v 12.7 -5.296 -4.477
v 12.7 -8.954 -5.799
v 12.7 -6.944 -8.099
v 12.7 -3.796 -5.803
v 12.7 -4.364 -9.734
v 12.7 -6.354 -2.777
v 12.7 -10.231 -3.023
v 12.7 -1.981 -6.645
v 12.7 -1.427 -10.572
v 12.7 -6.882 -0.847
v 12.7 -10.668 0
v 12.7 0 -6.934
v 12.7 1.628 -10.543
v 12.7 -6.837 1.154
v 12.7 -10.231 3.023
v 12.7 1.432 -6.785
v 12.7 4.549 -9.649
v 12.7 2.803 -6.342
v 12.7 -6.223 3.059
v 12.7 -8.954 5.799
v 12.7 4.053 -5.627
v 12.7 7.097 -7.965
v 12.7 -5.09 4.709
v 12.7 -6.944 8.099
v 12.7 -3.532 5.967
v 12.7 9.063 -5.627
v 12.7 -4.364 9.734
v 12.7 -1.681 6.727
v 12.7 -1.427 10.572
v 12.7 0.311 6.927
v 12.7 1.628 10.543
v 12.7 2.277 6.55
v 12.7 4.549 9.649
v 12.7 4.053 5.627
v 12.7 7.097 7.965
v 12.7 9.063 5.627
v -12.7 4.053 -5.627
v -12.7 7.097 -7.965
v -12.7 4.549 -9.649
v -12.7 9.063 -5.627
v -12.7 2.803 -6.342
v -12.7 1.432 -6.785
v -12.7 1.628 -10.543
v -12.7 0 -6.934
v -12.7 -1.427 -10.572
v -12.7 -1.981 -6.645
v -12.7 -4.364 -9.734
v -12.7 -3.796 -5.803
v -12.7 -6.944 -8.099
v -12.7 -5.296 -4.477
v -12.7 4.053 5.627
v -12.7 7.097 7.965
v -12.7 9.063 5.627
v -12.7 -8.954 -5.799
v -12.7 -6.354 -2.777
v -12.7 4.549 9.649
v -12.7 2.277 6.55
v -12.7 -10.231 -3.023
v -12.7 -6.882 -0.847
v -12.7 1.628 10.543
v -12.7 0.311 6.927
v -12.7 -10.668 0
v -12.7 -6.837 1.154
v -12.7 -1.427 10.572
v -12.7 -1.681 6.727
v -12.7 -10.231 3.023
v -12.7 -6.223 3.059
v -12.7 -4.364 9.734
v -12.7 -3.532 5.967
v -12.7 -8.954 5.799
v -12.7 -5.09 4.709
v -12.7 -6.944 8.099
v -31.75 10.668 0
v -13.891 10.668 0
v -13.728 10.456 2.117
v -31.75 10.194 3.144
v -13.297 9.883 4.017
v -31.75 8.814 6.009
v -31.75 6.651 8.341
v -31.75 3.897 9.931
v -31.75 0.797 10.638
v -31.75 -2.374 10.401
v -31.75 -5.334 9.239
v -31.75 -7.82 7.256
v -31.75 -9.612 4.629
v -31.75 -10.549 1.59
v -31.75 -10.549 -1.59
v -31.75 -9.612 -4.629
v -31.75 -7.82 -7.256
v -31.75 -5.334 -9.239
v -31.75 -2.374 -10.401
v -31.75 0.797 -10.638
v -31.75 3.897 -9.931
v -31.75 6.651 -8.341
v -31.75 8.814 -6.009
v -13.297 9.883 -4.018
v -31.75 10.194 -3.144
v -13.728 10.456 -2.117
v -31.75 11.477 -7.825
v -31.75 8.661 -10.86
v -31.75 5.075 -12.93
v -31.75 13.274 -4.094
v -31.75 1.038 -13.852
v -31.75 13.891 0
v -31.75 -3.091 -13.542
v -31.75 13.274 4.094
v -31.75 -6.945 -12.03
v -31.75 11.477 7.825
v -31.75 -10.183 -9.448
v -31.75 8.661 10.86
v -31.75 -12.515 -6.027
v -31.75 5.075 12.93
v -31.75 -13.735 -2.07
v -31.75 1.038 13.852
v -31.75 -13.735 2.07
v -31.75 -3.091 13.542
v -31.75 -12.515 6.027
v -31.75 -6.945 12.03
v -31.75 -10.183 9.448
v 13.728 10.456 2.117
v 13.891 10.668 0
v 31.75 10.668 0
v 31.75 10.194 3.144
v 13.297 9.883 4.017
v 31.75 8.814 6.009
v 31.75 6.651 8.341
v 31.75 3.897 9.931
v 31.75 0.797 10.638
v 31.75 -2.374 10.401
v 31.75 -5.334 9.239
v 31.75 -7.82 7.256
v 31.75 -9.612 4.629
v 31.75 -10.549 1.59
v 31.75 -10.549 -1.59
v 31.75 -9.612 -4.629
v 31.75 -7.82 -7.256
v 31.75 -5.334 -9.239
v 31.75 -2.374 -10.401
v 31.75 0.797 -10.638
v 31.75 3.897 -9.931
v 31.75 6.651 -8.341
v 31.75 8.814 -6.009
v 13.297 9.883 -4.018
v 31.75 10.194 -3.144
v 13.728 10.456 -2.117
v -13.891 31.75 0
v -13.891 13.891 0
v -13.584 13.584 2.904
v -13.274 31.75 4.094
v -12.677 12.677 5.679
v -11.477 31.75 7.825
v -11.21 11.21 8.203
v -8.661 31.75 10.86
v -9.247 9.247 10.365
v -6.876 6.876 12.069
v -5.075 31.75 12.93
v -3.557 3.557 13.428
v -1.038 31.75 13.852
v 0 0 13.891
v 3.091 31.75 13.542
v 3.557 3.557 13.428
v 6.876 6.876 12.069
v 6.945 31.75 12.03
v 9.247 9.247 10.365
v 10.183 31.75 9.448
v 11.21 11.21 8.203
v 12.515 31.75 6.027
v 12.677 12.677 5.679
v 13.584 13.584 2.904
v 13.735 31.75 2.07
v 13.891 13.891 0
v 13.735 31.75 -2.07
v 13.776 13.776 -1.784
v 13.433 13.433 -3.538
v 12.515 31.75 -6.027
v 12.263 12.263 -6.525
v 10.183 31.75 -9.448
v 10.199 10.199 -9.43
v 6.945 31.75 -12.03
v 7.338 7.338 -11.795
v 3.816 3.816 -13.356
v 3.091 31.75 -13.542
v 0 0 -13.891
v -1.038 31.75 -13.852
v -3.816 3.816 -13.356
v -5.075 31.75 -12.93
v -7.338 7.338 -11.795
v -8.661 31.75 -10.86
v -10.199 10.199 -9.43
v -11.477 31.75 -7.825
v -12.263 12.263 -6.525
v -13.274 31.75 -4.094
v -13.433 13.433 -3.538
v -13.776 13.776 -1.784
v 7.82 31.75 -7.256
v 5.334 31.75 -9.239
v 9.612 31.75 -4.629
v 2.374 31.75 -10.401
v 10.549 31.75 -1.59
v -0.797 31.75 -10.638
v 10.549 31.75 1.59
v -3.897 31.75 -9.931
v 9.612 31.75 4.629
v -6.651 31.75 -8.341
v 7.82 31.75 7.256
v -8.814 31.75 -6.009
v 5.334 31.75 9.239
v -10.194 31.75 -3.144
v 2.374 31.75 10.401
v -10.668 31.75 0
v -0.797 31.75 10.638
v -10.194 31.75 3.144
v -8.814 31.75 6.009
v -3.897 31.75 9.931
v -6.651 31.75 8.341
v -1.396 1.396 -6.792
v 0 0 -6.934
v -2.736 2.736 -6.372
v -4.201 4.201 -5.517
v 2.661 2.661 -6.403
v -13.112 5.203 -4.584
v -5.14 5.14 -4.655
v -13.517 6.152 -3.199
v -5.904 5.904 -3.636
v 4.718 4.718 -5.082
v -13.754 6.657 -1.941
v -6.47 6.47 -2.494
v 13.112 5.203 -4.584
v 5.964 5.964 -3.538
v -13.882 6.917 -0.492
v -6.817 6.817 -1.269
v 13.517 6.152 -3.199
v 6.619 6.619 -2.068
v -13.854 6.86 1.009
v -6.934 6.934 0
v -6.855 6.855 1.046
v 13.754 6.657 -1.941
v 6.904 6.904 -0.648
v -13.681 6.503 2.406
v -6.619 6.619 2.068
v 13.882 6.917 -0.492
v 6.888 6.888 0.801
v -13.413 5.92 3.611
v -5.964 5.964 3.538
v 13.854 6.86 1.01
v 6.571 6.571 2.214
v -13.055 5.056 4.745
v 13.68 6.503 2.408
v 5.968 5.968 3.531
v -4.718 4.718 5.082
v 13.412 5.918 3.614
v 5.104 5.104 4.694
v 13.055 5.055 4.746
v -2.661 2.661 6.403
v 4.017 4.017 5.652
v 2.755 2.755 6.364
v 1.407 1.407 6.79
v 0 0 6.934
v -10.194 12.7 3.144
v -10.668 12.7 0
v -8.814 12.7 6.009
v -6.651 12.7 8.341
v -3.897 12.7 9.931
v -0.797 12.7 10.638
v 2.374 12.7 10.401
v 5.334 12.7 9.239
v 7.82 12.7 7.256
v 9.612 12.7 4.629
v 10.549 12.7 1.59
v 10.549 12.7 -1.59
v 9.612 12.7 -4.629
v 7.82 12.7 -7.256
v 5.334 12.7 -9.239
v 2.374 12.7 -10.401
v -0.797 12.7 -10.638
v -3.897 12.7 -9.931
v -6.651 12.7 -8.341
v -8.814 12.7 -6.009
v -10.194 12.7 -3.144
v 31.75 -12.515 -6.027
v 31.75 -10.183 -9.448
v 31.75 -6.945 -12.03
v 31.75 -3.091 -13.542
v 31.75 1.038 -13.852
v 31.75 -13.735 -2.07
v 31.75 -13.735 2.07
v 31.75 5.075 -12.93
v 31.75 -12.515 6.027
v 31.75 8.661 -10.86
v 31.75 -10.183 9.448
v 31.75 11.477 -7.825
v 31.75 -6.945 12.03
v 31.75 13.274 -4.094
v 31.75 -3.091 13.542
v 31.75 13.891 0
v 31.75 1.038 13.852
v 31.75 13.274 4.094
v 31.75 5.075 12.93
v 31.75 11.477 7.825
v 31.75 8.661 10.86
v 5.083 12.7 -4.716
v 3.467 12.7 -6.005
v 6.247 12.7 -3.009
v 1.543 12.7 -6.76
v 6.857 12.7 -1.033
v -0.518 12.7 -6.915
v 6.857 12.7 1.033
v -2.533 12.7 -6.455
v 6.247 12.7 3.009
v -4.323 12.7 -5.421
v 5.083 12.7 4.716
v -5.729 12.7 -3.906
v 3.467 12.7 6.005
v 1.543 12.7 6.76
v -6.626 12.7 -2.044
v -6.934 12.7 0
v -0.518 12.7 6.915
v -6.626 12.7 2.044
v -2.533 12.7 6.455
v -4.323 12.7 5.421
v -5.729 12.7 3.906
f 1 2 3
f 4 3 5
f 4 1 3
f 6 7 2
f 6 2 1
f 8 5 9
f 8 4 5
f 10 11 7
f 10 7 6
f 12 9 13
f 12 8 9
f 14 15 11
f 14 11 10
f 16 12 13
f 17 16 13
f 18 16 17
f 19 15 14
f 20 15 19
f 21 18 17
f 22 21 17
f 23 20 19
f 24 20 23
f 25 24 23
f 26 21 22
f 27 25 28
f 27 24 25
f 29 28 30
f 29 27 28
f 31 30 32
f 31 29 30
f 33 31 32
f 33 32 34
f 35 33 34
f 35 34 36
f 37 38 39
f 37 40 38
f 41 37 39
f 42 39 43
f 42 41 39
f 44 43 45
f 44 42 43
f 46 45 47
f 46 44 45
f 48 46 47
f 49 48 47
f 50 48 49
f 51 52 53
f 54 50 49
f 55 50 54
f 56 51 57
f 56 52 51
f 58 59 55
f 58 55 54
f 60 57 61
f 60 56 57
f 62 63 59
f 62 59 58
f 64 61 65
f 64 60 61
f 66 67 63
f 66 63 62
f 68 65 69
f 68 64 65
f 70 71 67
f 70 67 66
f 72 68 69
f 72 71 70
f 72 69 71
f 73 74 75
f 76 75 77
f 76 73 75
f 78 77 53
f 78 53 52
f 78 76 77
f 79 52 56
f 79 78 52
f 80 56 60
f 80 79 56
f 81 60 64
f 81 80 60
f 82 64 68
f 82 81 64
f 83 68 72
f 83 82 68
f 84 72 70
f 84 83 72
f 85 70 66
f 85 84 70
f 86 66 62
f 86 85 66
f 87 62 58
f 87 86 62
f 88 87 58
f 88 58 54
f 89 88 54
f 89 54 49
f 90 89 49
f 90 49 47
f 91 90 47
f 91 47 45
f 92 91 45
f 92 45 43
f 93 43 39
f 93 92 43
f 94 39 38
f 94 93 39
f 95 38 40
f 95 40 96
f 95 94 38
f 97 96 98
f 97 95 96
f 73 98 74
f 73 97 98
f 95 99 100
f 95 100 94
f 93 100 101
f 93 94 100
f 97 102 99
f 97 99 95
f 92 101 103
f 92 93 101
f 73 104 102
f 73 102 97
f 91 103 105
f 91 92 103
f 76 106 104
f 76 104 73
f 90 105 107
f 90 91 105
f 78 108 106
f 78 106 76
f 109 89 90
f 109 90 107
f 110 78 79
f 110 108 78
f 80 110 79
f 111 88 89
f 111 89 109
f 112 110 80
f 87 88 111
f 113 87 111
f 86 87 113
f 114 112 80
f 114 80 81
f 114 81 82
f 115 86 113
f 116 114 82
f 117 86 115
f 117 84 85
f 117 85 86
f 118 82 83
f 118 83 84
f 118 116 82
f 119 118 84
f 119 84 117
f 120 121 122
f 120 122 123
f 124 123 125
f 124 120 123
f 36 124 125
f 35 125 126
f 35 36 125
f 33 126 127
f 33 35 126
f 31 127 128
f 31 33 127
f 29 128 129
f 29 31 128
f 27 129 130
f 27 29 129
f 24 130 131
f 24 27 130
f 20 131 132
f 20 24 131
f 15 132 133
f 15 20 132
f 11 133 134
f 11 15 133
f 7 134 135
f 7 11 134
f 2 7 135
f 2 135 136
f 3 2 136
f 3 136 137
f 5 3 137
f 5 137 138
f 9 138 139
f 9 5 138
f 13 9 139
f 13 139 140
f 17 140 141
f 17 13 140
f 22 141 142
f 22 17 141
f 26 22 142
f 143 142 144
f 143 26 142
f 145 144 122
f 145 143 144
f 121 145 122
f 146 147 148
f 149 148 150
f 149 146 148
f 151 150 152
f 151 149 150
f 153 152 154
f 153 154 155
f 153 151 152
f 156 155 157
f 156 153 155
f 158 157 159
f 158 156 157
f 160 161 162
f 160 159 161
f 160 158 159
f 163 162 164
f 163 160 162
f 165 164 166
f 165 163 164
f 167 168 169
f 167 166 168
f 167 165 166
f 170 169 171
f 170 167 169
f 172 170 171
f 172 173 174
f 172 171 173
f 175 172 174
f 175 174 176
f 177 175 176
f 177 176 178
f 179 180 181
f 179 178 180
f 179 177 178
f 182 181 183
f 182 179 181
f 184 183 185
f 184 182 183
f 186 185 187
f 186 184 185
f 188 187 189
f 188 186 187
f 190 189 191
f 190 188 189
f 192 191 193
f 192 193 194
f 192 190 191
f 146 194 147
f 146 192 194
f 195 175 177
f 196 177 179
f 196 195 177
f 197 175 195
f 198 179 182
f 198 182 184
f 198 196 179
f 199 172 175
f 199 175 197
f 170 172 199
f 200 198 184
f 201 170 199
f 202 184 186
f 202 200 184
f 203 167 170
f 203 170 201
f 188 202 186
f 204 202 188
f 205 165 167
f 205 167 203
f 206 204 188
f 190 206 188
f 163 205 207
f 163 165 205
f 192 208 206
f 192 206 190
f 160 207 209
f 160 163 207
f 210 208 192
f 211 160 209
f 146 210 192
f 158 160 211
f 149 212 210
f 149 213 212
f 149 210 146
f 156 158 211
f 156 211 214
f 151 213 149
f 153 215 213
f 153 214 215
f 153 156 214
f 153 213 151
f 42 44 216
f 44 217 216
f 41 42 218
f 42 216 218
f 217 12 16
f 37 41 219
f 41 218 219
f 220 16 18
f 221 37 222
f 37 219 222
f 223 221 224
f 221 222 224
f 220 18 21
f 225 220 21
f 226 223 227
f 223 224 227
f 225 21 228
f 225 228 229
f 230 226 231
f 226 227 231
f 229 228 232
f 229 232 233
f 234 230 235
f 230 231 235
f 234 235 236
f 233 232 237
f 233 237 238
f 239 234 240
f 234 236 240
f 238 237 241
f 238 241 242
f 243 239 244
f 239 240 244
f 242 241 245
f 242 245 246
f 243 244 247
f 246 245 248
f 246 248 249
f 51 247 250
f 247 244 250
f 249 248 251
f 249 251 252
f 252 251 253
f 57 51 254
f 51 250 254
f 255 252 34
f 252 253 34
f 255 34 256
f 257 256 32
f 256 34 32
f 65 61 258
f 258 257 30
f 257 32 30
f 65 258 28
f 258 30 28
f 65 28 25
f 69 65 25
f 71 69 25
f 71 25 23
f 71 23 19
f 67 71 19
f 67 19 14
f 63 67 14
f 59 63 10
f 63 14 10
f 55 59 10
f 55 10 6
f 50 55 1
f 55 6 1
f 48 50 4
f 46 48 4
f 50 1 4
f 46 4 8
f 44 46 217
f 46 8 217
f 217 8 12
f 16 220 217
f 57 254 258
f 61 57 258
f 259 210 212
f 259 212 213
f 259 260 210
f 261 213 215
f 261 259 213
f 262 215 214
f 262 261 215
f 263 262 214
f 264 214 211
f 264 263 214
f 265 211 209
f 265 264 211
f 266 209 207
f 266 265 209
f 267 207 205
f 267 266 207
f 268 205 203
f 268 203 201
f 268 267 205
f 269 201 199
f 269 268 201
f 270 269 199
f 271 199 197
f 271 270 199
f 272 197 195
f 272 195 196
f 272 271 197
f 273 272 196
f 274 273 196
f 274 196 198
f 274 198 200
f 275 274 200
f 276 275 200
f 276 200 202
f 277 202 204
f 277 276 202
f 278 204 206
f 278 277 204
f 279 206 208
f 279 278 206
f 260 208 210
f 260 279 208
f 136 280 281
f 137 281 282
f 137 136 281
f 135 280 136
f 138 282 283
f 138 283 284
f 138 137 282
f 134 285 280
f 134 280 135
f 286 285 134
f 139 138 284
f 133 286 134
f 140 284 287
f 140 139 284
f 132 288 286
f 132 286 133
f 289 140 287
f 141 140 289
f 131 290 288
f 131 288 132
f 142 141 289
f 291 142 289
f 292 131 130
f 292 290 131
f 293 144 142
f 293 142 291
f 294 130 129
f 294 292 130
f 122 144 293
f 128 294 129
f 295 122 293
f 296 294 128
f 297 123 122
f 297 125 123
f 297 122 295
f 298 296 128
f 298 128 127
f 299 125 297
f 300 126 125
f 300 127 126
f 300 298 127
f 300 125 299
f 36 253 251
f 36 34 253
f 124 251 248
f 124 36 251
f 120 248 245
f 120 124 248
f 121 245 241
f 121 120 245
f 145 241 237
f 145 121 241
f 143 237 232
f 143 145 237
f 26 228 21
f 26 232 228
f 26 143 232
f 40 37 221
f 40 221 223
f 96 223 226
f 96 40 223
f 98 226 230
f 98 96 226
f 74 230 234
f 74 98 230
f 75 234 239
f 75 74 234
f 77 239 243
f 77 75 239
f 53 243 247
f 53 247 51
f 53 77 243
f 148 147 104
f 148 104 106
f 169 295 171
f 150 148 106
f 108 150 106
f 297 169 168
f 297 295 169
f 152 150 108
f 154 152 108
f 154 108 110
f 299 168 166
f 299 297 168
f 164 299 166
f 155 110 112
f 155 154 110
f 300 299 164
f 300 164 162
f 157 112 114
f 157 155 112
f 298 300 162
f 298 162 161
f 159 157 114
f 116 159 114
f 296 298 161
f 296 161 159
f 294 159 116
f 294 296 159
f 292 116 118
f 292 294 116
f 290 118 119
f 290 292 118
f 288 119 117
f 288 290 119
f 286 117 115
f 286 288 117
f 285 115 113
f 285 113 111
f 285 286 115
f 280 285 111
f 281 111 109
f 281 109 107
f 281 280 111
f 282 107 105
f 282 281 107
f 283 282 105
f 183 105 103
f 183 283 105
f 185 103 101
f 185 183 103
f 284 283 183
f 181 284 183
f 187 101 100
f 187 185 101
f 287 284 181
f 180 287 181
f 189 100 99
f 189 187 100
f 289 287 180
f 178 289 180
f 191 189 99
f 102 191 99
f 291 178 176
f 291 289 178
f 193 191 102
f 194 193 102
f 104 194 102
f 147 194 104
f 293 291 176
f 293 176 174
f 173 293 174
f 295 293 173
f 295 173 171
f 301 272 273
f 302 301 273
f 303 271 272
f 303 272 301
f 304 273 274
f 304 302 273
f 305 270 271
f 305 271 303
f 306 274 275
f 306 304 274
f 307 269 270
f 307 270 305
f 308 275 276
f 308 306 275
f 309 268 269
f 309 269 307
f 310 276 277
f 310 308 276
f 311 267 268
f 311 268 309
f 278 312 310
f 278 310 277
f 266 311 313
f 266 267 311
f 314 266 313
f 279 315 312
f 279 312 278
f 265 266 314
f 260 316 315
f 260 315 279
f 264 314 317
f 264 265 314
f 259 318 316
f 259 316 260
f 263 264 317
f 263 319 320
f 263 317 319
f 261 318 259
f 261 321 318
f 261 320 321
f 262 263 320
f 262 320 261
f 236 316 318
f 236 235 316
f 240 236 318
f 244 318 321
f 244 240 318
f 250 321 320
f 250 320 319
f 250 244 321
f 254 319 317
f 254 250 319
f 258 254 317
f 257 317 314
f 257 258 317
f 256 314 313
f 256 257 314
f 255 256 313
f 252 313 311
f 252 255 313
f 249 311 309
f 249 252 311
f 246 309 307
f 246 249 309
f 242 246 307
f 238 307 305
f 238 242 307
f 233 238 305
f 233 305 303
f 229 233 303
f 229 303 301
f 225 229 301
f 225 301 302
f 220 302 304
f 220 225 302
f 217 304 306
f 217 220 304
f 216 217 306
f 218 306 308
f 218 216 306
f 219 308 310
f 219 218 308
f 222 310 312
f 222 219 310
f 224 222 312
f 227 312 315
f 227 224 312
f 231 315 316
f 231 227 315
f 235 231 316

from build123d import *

# Parameters (mm, degrees)
SKETCH2_W               = 13.890625
SKETCH2_H               = 31.75
CUT_EXTRUDE1_DEPTH      = 48.000792219
CUT_EXTRUDE1_DEPTH_BACK = 48.000792219
SKETCH4_R               = 6.9342


with BuildPart() as part:
    # Sketch1 → Revolve1 (revolve)
    with BuildSketch(Plane.XY):
        Polygon((-31.75, 13.890625), (31.75, 13.890625), (31.75, 10.668), (12.7, 10.668), (12.7, 0), (-12.7, 0), (-12.7, 10.668), (-31.75, 10.668), align=None)
    revolve(axis=Axis((0, 0, 0), (1, 0, 0)))

    # Sketch2 → Revolve2 (revolve)
    with BuildSketch(Plane.XY):
        with Locations((-6.9453125, 15.875)):
            Rectangle(SKETCH2_W, SKETCH2_H)
    revolve(axis=Axis((0, 38.237555026, 0), (0, 1, 0)))

    # Sketch3 → Cut-Revolve1 (revolve, cut)
    with BuildSketch(Plane.XY):
        Polygon((0, 31.75), (-10.668, 31.75), (-10.668, 12.7), (-6.9342, 12.7), (-6.9342, 0), (0, 0), align=None)
    revolve(axis=Axis((0, 78.208657222, 0), (0, 1, 0)), mode=Mode.SUBTRACT)

    # Sketch4 → Cut-Extrude1 (cut, two sides: drawn at the far end of the back side and taken through both)
    with BuildSketch(Plane(origin=(0, 0, 0), x_dir=(0, 0, -1), z_dir=(1, 0, 0)).offset(-CUT_EXTRUDE1_DEPTH_BACK)):
        Circle(SKETCH4_R)
    extrude(amount=CUT_EXTRUDE1_DEPTH + CUT_EXTRUDE1_DEPTH_BACK, mode=Mode.SUBTRACT)


solid = part.part
